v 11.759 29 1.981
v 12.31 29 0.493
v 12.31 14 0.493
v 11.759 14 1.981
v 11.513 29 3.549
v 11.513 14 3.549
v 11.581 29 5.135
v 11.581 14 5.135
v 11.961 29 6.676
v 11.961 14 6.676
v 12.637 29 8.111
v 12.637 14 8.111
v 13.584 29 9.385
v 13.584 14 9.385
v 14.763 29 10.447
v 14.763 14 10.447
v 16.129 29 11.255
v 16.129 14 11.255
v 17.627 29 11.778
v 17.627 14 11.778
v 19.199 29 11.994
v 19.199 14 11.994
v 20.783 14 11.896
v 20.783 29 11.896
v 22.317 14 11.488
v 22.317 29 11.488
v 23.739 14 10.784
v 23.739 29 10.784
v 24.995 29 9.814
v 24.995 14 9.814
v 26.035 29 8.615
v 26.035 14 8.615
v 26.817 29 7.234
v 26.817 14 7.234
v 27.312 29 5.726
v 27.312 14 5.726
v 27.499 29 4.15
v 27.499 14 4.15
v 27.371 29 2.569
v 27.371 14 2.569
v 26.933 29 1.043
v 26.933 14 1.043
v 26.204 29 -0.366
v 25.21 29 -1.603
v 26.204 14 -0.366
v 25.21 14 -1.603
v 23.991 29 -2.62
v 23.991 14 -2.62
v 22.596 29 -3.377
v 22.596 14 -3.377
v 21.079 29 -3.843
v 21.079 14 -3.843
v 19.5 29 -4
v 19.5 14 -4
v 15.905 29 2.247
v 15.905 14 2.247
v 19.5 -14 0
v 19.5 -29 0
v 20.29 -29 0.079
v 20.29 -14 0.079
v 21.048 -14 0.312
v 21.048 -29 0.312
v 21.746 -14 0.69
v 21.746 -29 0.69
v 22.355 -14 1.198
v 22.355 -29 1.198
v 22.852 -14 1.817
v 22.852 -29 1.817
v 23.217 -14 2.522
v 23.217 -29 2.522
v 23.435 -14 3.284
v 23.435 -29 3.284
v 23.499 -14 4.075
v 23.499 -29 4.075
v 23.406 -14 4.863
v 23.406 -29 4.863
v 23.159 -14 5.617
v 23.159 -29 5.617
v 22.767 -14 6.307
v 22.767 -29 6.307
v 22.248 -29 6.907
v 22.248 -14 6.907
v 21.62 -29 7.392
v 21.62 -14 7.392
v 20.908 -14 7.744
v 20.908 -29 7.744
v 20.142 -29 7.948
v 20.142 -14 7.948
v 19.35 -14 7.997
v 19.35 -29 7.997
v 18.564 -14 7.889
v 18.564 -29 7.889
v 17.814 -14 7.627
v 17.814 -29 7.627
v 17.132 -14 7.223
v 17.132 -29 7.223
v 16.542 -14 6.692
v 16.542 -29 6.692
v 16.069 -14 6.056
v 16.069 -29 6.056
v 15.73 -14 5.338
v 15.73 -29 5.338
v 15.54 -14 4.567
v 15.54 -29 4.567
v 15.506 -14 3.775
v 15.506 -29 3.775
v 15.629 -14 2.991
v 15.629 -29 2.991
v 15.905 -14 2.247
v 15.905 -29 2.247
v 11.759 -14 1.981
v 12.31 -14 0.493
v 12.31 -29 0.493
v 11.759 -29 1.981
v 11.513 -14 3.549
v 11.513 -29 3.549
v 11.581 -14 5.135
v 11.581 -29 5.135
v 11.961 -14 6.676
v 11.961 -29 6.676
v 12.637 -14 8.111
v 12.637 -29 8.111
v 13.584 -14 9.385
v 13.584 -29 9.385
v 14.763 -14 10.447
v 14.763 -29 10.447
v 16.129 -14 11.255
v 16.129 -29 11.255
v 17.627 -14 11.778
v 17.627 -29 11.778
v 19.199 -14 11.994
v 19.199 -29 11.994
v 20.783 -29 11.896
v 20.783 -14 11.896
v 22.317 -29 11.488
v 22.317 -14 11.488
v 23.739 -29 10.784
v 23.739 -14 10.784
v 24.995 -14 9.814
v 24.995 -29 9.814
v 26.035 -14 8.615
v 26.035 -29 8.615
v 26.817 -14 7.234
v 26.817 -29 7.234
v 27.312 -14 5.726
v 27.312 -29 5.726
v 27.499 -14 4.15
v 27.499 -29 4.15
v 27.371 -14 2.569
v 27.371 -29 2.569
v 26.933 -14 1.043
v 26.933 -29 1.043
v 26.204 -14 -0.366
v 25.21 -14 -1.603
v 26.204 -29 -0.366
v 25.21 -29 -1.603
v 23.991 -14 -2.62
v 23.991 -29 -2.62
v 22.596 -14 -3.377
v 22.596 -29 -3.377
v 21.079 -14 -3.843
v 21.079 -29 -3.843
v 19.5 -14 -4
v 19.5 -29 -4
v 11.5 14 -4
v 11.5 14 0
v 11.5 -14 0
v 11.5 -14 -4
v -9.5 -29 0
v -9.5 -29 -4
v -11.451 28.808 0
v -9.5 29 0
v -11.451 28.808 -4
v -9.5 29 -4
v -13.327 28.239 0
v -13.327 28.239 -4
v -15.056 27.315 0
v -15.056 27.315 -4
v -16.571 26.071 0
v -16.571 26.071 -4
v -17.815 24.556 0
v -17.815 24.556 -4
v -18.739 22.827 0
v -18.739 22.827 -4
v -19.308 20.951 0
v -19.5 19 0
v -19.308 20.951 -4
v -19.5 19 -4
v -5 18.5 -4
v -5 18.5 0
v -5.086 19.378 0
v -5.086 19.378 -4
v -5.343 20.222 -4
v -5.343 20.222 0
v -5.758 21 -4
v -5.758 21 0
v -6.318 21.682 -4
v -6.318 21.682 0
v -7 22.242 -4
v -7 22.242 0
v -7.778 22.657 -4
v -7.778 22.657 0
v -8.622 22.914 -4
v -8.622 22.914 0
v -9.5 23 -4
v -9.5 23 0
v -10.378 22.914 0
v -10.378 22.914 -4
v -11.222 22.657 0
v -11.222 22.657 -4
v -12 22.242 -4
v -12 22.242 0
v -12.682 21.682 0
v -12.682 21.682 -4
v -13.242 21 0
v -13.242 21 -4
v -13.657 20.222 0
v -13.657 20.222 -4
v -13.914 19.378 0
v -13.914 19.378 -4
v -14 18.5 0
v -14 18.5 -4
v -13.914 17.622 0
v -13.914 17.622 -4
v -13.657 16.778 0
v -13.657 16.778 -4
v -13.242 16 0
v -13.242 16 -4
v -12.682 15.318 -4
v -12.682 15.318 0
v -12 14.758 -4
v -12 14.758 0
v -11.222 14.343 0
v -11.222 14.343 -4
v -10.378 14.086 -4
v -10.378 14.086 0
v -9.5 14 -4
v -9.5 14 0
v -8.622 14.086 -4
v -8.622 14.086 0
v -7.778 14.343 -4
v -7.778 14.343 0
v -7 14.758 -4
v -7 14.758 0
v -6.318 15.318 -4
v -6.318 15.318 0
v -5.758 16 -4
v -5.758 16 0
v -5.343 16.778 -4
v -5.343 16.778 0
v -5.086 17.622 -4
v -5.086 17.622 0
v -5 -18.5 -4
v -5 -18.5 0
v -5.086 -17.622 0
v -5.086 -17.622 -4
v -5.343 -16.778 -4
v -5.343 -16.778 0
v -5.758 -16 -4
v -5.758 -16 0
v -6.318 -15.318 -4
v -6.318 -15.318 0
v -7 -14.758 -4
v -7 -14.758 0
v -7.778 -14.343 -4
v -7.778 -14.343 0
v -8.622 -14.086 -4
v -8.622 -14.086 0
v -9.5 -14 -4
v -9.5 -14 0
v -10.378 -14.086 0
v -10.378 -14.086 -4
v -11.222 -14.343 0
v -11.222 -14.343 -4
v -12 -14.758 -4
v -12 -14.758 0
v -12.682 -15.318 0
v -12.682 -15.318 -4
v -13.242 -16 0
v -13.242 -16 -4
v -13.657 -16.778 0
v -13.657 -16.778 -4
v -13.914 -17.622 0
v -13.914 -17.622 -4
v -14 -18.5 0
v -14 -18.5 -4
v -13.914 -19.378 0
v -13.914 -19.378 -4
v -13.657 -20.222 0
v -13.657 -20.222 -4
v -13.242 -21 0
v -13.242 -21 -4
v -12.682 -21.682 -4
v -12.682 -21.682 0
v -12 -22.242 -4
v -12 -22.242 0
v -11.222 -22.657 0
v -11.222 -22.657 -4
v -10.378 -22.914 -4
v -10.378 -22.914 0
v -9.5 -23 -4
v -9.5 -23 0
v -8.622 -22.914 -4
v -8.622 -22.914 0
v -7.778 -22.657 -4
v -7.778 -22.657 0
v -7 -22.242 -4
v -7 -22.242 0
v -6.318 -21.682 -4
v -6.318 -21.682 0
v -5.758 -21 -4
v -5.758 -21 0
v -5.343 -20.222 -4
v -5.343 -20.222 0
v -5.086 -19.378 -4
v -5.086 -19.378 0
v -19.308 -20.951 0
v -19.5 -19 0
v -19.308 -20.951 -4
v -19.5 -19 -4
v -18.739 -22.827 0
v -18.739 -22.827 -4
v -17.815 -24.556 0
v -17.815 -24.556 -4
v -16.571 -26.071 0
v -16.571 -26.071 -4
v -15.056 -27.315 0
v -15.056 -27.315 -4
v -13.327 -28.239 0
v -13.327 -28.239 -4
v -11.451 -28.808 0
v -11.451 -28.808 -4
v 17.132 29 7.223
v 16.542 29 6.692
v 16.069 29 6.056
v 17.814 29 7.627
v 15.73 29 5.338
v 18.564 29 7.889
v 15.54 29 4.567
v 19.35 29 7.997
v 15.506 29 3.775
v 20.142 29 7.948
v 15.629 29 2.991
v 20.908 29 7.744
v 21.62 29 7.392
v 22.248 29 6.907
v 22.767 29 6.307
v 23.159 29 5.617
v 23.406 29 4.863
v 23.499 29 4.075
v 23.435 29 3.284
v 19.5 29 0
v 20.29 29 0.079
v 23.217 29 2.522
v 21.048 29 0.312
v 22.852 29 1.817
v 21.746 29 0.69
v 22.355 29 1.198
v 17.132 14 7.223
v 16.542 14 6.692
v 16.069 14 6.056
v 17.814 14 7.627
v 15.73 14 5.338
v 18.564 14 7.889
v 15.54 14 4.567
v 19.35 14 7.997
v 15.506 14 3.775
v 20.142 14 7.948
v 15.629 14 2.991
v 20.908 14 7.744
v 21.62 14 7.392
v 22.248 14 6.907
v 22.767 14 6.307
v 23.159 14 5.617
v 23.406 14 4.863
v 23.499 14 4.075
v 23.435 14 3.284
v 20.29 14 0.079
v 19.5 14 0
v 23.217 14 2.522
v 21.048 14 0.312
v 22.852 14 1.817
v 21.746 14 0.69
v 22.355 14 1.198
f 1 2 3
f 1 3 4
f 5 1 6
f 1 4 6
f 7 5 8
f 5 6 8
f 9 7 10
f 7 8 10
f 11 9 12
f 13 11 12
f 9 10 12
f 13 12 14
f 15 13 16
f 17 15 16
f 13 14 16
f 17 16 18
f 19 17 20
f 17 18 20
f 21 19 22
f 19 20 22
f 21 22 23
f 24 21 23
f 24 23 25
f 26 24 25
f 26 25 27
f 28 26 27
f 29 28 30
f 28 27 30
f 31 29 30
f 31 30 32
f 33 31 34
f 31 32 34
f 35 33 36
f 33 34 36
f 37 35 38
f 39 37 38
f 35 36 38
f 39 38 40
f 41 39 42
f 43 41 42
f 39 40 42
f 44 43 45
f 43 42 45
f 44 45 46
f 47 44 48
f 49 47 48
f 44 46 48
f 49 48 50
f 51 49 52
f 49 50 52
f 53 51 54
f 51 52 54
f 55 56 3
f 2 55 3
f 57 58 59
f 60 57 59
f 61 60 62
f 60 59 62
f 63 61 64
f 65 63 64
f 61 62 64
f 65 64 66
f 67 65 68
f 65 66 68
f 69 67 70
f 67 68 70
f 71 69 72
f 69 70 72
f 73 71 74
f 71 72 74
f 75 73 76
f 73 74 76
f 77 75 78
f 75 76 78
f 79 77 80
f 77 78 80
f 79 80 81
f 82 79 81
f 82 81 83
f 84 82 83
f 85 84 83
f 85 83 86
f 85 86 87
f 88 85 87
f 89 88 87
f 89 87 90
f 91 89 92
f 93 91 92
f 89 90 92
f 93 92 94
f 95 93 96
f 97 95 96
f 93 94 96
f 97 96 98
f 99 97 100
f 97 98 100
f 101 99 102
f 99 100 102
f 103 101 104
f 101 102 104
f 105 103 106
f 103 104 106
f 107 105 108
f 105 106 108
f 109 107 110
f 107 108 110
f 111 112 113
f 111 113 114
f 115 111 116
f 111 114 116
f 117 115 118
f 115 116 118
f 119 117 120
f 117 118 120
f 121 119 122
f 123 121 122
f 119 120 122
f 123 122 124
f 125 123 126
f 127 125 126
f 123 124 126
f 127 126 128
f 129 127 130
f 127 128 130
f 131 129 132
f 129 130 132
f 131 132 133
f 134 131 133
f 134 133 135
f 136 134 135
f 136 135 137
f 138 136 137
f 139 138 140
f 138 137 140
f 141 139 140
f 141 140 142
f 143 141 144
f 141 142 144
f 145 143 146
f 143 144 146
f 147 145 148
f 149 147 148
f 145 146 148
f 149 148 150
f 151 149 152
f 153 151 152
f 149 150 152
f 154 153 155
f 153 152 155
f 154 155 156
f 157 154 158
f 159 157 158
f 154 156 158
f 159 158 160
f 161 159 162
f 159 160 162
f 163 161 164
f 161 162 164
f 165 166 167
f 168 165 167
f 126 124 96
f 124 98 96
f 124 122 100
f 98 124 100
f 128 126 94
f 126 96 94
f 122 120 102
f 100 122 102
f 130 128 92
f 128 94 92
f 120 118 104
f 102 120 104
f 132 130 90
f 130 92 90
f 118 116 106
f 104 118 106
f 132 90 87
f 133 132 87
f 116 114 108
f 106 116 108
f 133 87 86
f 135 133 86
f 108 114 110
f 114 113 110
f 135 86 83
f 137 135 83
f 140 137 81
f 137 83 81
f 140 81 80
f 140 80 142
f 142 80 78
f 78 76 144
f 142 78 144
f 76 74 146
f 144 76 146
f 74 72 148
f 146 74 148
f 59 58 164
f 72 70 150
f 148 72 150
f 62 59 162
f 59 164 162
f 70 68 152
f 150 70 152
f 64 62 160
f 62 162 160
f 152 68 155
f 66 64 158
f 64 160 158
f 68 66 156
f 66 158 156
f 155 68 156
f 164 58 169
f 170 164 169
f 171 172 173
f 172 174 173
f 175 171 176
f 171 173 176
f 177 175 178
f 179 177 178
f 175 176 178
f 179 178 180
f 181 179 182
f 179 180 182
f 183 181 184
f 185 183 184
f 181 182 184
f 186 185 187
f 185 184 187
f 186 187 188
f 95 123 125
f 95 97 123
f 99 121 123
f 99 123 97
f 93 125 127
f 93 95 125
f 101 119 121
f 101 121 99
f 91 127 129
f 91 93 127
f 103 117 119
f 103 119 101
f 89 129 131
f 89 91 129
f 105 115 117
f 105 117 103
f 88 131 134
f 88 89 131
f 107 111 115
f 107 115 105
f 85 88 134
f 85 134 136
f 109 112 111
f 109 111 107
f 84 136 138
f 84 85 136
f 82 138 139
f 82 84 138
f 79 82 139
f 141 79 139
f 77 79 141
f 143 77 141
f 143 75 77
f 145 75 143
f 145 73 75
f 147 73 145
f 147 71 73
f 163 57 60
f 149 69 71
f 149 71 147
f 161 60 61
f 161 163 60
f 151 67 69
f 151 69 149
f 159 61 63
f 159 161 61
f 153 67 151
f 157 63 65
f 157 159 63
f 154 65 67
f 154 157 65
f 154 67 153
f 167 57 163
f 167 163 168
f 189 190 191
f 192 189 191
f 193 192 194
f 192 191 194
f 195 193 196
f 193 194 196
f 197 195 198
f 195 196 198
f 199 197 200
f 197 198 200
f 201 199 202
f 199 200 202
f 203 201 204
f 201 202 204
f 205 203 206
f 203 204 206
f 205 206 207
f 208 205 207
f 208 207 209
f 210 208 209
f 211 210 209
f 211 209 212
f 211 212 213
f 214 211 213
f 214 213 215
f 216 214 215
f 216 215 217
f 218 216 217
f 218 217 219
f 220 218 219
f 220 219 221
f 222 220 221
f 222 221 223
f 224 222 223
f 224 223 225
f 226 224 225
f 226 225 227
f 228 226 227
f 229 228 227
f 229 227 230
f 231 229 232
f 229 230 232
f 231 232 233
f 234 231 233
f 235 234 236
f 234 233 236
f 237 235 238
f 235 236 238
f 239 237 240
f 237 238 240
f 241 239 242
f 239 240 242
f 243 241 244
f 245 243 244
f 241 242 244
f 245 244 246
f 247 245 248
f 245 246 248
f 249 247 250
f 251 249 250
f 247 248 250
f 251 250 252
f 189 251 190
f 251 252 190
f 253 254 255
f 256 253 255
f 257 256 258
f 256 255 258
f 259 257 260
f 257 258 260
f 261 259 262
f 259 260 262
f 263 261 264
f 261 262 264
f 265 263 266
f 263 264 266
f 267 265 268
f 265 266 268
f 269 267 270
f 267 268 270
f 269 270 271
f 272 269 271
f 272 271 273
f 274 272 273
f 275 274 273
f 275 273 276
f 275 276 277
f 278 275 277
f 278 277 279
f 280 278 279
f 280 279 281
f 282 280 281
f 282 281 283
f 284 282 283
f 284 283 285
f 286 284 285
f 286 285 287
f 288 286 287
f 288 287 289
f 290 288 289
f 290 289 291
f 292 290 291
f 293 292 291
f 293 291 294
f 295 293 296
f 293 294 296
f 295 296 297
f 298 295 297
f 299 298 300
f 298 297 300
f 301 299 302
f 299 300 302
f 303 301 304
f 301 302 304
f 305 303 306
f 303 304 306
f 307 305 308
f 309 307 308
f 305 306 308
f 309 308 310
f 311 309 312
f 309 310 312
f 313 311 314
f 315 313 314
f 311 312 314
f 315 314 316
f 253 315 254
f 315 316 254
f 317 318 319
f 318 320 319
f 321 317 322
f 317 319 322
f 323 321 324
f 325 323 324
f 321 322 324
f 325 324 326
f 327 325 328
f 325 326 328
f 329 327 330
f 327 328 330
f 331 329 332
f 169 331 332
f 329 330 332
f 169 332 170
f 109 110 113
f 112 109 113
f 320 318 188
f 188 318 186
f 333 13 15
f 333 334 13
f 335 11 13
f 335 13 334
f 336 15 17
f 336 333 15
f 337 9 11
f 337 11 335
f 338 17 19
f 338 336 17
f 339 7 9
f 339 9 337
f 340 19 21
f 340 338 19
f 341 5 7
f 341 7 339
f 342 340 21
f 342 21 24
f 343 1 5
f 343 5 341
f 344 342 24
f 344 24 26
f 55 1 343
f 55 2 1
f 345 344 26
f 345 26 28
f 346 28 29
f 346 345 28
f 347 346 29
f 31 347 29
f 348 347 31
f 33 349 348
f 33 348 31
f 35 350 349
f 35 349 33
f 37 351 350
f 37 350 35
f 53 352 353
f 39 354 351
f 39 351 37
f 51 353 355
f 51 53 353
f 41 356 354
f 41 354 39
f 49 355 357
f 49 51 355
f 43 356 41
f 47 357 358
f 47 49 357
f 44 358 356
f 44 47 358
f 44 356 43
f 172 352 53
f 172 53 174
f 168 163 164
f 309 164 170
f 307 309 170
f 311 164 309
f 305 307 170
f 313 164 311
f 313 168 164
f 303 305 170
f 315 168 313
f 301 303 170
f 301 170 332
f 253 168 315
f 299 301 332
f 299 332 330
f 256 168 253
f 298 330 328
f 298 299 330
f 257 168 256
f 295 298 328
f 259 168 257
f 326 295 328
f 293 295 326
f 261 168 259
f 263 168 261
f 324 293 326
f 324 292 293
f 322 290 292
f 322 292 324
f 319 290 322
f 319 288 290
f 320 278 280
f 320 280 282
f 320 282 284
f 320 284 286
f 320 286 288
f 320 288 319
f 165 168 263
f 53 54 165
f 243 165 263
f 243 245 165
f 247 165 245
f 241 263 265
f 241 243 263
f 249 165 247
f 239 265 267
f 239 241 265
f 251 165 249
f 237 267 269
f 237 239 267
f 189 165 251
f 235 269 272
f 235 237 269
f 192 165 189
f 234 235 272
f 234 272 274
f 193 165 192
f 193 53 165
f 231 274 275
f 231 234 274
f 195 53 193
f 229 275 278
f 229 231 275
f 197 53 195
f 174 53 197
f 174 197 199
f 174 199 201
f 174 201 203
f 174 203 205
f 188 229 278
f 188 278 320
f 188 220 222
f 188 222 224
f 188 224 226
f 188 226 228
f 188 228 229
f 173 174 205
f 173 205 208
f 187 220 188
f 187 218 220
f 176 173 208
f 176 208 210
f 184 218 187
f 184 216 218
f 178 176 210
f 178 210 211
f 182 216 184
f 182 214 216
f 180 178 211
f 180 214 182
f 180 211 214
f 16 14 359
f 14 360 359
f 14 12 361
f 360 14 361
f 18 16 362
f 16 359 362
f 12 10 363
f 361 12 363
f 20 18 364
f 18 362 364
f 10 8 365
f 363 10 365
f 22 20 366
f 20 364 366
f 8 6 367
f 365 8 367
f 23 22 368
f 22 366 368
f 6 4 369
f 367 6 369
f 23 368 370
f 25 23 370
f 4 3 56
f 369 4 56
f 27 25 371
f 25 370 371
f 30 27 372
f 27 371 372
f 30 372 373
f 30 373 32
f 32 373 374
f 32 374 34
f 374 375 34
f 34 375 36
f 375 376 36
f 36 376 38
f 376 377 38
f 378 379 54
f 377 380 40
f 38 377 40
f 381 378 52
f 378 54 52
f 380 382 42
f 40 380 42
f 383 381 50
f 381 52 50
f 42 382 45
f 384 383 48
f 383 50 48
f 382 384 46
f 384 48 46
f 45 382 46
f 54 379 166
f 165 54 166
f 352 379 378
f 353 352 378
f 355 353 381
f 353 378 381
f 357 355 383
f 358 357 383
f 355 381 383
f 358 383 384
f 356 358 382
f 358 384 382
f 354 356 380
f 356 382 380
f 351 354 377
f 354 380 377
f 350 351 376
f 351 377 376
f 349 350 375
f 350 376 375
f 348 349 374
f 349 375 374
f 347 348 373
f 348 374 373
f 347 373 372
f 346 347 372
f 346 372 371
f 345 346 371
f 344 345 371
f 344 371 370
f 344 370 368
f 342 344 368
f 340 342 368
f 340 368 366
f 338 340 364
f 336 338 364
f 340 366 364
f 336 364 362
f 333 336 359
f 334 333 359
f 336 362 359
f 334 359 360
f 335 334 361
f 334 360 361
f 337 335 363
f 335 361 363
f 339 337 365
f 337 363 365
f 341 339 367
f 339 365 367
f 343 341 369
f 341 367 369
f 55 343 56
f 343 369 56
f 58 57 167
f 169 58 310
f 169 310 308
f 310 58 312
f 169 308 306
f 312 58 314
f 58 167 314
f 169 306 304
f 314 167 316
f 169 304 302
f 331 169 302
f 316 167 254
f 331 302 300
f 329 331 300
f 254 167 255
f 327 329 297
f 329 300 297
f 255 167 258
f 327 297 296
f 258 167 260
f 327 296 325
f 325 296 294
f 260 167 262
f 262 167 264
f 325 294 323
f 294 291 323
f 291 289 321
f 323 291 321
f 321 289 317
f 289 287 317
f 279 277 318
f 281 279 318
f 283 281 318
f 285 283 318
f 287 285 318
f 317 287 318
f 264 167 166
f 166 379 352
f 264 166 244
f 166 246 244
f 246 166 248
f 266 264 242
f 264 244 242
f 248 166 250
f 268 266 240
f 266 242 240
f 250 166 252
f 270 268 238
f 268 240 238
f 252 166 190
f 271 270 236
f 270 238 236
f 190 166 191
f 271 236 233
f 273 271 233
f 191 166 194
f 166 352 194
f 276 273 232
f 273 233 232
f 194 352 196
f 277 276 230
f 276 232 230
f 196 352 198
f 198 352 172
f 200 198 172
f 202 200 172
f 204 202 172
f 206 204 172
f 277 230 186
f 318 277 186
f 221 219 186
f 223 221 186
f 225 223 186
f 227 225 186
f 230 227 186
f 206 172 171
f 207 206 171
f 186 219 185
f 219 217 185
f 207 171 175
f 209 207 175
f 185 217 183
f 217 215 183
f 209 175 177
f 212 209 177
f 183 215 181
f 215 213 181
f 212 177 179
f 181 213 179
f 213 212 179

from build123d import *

# Parameters (mm, degrees)
BASE_FLANGE1_DEPTH = 4
HEM2_START         = -29
HEM2_DEPTH         = 15
HEM2_START_2       = 14
HEM2_2_DEPTH       = 15
SKETCH16_R         = 4.5
CUT_EXTRUDE1_DEPTH = 10
FILLET1_R          = 10


# Read off the part's stored shape, not the designer's step: Hem2
# Sheet-metal steps are written as plain solids
with BuildPart() as part:
    # Sketch1 → Base-Flange1 (new body)
    with BuildSketch(Plane.XY):
        Polygon((-19.5, 29), (19.5, 29), (19.5, 14), (11.5, 14), (11.5, -14), (19.5, -14), (19.5, -29), (-19.5, -29), align=None)
    extrude(amount=-BASE_FLANGE1_DEPTH)

    # Hem2 outline → Hem2 (add)
    with BuildSketch(Plane(origin=(0, 0, 0), x_dir=(1, 0, 0), z_dir=(0, 1, 0)).offset(HEM2_START)):
        with BuildLine():
            Line((15.904823815, -2.246515413), (12.30964763, -0.493030826))
            ThreePointArc((12.30964763, -0.493030826), (23.739354115, -10.784384769), (19.5, 4))
            Line((19.5, 4), (19.5, 0))
            ThreePointArc((19.5, 0), (21.619677058, -7.392192385), (15.904823815, -2.246515413))
        make_face()
    extrude(amount=HEM2_DEPTH)

    # Hem2 2 outline → Hem2 2 (add)
    with BuildSketch(Plane(origin=(0, 0, 0), x_dir=(1, 0, 0), z_dir=(0, 1, 0)).offset(HEM2_START_2)):
        with BuildLine():
            Line((15.904823815, -2.246515413), (12.30964763, -0.493030826))
            ThreePointArc((12.30964763, -0.493030826), (23.739354115, -10.784384769), (19.5, 4))
            Line((19.5, 4), (19.5, 0))
            ThreePointArc((19.5, 0), (21.619677058, -7.392192385), (15.904823815, -2.246515413))
        make_face()
    extrude(amount=HEM2_2_DEPTH)

    # Sketch16 → Cut-Extrude1 (cut)
    with BuildSketch(Plane.XY):
        with Locations((-9.5, 18.5)):
            Circle(SKETCH16_R)
        with Locations((-9.5, -18.5)):
            Circle(SKETCH16_R)
    extrude(amount=-CUT_EXTRUDE1_DEPTH, mode=Mode.SUBTRACT)

    # Fillet1
    fillet1_edges = [part.edges().sort_by_distance(p)[0] for p in [
        (-19.5, -29, -2),
        (-19.5, 29, -2),
    ]]
    fillet(fillet1_edges, radius=FILLET1_R)


solid = part.part
